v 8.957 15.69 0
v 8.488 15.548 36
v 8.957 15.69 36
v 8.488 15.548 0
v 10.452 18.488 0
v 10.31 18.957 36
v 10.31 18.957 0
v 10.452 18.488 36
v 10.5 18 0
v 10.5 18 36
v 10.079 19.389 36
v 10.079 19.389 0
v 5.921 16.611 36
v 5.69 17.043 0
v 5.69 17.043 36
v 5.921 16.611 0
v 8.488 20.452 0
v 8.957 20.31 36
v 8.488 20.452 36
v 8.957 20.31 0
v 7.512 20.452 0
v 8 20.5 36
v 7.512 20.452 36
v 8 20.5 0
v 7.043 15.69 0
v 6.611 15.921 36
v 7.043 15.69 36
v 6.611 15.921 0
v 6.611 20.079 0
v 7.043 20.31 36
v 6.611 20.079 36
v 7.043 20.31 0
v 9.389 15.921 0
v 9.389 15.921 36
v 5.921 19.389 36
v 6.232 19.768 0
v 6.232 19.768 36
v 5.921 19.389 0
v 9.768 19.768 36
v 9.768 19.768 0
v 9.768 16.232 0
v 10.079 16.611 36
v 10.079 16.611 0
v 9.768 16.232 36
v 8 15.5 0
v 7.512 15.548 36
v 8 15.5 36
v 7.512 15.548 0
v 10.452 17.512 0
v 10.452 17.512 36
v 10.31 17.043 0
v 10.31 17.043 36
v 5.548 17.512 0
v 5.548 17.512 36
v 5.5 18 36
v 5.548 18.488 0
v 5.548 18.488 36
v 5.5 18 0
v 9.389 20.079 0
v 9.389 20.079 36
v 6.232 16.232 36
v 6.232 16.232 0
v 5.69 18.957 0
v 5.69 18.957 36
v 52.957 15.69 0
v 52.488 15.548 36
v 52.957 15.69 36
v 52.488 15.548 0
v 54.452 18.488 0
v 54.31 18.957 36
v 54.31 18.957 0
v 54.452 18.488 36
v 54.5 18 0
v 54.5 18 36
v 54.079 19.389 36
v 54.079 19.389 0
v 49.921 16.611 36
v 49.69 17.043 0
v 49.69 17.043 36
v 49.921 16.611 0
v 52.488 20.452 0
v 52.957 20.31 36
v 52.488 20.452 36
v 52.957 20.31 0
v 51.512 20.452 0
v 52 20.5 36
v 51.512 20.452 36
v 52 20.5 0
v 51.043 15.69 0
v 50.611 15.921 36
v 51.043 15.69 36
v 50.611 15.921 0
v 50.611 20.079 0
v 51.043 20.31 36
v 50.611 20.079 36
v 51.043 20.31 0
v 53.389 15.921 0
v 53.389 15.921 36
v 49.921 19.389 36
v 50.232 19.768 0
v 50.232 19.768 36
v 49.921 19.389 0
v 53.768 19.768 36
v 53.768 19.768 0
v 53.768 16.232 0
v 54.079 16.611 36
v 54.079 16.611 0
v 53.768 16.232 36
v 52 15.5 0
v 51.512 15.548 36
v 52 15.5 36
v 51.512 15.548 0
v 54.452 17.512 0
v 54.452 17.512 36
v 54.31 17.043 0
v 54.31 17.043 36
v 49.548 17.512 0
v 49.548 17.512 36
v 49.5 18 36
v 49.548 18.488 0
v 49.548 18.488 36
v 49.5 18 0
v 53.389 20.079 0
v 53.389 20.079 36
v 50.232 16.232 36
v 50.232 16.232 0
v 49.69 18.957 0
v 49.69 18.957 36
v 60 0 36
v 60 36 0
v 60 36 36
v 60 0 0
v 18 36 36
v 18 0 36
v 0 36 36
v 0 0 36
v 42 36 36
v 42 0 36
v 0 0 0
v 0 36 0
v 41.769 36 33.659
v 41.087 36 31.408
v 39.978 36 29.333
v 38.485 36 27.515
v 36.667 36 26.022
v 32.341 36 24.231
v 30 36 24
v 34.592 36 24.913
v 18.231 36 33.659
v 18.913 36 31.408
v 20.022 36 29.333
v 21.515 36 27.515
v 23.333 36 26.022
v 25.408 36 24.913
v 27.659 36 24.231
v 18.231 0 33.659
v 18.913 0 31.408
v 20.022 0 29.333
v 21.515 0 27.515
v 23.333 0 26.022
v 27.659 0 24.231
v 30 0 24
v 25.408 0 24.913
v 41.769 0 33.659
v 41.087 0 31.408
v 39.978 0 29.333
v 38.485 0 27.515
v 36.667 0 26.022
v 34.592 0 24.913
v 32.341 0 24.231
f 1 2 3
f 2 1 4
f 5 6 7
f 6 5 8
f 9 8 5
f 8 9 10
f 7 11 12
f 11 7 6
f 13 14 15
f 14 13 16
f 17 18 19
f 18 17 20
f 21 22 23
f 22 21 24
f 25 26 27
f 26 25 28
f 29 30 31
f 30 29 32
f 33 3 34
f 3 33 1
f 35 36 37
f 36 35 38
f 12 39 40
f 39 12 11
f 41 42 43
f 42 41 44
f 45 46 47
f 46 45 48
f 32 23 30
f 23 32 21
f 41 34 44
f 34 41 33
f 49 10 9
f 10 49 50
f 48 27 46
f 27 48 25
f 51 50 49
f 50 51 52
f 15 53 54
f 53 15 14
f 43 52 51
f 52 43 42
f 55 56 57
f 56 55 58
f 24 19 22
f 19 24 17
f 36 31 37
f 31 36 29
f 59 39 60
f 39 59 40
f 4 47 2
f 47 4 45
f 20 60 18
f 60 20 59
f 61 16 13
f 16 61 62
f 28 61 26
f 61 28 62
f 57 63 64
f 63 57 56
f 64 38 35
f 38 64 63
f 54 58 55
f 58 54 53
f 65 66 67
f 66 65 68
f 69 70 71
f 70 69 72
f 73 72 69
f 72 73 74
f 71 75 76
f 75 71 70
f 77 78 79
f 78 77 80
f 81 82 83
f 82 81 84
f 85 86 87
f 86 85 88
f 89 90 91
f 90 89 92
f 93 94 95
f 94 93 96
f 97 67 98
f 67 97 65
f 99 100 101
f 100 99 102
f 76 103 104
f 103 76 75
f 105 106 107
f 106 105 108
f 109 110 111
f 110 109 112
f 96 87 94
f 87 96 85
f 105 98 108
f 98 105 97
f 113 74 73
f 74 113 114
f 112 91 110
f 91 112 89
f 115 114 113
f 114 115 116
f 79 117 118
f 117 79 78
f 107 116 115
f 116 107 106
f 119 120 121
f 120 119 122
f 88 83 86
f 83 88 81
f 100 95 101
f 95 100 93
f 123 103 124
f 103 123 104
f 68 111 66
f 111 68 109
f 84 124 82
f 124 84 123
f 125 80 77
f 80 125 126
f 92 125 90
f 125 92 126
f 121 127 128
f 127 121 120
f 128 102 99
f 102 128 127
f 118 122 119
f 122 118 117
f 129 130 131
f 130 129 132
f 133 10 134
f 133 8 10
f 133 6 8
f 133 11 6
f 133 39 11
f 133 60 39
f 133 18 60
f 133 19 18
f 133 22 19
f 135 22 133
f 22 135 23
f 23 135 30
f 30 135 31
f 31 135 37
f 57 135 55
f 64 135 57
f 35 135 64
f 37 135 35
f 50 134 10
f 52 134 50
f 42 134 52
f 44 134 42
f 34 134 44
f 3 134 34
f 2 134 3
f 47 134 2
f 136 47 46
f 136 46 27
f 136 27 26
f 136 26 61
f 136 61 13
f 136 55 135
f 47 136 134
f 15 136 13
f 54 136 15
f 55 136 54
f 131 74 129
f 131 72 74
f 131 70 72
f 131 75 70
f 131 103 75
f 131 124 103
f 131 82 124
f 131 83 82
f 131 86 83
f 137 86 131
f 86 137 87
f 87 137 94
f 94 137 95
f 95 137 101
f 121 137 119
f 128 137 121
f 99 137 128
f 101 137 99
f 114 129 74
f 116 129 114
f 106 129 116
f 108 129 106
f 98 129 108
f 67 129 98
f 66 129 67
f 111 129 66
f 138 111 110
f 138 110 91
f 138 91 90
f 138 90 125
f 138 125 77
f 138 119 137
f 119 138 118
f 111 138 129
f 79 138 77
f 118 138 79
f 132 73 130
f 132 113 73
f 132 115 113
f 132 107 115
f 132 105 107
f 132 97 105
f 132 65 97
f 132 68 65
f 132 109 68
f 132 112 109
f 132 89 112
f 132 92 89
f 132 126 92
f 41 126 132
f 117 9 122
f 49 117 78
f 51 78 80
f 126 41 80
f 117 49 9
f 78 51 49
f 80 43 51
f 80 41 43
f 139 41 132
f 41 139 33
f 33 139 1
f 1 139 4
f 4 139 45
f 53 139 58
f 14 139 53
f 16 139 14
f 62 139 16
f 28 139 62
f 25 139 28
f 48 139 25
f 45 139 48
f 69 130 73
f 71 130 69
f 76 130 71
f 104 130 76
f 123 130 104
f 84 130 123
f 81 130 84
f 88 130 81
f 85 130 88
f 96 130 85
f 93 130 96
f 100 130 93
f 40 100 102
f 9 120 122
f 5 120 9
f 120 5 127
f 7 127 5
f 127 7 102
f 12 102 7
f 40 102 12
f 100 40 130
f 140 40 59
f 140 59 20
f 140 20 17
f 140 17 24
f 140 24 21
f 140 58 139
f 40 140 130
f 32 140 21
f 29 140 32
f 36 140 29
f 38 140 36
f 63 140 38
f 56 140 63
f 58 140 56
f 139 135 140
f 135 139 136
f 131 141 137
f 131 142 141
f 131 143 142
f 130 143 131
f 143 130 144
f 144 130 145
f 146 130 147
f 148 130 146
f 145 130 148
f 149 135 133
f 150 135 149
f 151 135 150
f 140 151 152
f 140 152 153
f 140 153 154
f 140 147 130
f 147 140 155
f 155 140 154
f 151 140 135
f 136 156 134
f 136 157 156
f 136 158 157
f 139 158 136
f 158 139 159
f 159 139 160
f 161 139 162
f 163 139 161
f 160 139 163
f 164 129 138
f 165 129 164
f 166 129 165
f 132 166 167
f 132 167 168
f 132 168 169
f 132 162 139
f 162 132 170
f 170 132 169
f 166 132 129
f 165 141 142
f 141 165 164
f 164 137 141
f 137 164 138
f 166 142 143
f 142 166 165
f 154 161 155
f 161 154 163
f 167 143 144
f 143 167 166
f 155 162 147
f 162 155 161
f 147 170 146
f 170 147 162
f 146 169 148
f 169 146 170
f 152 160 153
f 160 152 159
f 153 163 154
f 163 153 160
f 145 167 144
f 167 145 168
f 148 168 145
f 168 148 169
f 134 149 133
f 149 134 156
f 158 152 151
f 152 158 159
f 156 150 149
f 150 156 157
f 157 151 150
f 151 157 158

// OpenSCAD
$fn = 32;

// ----------------------------------------------------------------------
// Saddle clamp: plain shaft clamp
// ----------------------------------------------------------------------

// --- parameters (mm) ---
blk_l = 60;               // block length, X
blk_w = 36;               // block width, Y
blk_h = 36;               // block height
clamp_r = 12;             // shaft groove radius
hole_r = 2.5;             // bolt hole radius
hole_m = 8;               // bolt hole margin from the ends

saw_depth = clamp_r + 3;  // saw kerf depth

difference() {
  cube([blk_l, blk_w, blk_h]);
  translate([blk_l / 2, -1, blk_h])
    rotate([-90, 0, 0])
      cylinder(h = blk_w + 2, r = clamp_r);
  for (sx = [0, 1])
    translate([sx ? blk_l - hole_m : hole_m, blk_w / 2, -1])
      cylinder(r = hole_r, h = blk_h + 2);
}
